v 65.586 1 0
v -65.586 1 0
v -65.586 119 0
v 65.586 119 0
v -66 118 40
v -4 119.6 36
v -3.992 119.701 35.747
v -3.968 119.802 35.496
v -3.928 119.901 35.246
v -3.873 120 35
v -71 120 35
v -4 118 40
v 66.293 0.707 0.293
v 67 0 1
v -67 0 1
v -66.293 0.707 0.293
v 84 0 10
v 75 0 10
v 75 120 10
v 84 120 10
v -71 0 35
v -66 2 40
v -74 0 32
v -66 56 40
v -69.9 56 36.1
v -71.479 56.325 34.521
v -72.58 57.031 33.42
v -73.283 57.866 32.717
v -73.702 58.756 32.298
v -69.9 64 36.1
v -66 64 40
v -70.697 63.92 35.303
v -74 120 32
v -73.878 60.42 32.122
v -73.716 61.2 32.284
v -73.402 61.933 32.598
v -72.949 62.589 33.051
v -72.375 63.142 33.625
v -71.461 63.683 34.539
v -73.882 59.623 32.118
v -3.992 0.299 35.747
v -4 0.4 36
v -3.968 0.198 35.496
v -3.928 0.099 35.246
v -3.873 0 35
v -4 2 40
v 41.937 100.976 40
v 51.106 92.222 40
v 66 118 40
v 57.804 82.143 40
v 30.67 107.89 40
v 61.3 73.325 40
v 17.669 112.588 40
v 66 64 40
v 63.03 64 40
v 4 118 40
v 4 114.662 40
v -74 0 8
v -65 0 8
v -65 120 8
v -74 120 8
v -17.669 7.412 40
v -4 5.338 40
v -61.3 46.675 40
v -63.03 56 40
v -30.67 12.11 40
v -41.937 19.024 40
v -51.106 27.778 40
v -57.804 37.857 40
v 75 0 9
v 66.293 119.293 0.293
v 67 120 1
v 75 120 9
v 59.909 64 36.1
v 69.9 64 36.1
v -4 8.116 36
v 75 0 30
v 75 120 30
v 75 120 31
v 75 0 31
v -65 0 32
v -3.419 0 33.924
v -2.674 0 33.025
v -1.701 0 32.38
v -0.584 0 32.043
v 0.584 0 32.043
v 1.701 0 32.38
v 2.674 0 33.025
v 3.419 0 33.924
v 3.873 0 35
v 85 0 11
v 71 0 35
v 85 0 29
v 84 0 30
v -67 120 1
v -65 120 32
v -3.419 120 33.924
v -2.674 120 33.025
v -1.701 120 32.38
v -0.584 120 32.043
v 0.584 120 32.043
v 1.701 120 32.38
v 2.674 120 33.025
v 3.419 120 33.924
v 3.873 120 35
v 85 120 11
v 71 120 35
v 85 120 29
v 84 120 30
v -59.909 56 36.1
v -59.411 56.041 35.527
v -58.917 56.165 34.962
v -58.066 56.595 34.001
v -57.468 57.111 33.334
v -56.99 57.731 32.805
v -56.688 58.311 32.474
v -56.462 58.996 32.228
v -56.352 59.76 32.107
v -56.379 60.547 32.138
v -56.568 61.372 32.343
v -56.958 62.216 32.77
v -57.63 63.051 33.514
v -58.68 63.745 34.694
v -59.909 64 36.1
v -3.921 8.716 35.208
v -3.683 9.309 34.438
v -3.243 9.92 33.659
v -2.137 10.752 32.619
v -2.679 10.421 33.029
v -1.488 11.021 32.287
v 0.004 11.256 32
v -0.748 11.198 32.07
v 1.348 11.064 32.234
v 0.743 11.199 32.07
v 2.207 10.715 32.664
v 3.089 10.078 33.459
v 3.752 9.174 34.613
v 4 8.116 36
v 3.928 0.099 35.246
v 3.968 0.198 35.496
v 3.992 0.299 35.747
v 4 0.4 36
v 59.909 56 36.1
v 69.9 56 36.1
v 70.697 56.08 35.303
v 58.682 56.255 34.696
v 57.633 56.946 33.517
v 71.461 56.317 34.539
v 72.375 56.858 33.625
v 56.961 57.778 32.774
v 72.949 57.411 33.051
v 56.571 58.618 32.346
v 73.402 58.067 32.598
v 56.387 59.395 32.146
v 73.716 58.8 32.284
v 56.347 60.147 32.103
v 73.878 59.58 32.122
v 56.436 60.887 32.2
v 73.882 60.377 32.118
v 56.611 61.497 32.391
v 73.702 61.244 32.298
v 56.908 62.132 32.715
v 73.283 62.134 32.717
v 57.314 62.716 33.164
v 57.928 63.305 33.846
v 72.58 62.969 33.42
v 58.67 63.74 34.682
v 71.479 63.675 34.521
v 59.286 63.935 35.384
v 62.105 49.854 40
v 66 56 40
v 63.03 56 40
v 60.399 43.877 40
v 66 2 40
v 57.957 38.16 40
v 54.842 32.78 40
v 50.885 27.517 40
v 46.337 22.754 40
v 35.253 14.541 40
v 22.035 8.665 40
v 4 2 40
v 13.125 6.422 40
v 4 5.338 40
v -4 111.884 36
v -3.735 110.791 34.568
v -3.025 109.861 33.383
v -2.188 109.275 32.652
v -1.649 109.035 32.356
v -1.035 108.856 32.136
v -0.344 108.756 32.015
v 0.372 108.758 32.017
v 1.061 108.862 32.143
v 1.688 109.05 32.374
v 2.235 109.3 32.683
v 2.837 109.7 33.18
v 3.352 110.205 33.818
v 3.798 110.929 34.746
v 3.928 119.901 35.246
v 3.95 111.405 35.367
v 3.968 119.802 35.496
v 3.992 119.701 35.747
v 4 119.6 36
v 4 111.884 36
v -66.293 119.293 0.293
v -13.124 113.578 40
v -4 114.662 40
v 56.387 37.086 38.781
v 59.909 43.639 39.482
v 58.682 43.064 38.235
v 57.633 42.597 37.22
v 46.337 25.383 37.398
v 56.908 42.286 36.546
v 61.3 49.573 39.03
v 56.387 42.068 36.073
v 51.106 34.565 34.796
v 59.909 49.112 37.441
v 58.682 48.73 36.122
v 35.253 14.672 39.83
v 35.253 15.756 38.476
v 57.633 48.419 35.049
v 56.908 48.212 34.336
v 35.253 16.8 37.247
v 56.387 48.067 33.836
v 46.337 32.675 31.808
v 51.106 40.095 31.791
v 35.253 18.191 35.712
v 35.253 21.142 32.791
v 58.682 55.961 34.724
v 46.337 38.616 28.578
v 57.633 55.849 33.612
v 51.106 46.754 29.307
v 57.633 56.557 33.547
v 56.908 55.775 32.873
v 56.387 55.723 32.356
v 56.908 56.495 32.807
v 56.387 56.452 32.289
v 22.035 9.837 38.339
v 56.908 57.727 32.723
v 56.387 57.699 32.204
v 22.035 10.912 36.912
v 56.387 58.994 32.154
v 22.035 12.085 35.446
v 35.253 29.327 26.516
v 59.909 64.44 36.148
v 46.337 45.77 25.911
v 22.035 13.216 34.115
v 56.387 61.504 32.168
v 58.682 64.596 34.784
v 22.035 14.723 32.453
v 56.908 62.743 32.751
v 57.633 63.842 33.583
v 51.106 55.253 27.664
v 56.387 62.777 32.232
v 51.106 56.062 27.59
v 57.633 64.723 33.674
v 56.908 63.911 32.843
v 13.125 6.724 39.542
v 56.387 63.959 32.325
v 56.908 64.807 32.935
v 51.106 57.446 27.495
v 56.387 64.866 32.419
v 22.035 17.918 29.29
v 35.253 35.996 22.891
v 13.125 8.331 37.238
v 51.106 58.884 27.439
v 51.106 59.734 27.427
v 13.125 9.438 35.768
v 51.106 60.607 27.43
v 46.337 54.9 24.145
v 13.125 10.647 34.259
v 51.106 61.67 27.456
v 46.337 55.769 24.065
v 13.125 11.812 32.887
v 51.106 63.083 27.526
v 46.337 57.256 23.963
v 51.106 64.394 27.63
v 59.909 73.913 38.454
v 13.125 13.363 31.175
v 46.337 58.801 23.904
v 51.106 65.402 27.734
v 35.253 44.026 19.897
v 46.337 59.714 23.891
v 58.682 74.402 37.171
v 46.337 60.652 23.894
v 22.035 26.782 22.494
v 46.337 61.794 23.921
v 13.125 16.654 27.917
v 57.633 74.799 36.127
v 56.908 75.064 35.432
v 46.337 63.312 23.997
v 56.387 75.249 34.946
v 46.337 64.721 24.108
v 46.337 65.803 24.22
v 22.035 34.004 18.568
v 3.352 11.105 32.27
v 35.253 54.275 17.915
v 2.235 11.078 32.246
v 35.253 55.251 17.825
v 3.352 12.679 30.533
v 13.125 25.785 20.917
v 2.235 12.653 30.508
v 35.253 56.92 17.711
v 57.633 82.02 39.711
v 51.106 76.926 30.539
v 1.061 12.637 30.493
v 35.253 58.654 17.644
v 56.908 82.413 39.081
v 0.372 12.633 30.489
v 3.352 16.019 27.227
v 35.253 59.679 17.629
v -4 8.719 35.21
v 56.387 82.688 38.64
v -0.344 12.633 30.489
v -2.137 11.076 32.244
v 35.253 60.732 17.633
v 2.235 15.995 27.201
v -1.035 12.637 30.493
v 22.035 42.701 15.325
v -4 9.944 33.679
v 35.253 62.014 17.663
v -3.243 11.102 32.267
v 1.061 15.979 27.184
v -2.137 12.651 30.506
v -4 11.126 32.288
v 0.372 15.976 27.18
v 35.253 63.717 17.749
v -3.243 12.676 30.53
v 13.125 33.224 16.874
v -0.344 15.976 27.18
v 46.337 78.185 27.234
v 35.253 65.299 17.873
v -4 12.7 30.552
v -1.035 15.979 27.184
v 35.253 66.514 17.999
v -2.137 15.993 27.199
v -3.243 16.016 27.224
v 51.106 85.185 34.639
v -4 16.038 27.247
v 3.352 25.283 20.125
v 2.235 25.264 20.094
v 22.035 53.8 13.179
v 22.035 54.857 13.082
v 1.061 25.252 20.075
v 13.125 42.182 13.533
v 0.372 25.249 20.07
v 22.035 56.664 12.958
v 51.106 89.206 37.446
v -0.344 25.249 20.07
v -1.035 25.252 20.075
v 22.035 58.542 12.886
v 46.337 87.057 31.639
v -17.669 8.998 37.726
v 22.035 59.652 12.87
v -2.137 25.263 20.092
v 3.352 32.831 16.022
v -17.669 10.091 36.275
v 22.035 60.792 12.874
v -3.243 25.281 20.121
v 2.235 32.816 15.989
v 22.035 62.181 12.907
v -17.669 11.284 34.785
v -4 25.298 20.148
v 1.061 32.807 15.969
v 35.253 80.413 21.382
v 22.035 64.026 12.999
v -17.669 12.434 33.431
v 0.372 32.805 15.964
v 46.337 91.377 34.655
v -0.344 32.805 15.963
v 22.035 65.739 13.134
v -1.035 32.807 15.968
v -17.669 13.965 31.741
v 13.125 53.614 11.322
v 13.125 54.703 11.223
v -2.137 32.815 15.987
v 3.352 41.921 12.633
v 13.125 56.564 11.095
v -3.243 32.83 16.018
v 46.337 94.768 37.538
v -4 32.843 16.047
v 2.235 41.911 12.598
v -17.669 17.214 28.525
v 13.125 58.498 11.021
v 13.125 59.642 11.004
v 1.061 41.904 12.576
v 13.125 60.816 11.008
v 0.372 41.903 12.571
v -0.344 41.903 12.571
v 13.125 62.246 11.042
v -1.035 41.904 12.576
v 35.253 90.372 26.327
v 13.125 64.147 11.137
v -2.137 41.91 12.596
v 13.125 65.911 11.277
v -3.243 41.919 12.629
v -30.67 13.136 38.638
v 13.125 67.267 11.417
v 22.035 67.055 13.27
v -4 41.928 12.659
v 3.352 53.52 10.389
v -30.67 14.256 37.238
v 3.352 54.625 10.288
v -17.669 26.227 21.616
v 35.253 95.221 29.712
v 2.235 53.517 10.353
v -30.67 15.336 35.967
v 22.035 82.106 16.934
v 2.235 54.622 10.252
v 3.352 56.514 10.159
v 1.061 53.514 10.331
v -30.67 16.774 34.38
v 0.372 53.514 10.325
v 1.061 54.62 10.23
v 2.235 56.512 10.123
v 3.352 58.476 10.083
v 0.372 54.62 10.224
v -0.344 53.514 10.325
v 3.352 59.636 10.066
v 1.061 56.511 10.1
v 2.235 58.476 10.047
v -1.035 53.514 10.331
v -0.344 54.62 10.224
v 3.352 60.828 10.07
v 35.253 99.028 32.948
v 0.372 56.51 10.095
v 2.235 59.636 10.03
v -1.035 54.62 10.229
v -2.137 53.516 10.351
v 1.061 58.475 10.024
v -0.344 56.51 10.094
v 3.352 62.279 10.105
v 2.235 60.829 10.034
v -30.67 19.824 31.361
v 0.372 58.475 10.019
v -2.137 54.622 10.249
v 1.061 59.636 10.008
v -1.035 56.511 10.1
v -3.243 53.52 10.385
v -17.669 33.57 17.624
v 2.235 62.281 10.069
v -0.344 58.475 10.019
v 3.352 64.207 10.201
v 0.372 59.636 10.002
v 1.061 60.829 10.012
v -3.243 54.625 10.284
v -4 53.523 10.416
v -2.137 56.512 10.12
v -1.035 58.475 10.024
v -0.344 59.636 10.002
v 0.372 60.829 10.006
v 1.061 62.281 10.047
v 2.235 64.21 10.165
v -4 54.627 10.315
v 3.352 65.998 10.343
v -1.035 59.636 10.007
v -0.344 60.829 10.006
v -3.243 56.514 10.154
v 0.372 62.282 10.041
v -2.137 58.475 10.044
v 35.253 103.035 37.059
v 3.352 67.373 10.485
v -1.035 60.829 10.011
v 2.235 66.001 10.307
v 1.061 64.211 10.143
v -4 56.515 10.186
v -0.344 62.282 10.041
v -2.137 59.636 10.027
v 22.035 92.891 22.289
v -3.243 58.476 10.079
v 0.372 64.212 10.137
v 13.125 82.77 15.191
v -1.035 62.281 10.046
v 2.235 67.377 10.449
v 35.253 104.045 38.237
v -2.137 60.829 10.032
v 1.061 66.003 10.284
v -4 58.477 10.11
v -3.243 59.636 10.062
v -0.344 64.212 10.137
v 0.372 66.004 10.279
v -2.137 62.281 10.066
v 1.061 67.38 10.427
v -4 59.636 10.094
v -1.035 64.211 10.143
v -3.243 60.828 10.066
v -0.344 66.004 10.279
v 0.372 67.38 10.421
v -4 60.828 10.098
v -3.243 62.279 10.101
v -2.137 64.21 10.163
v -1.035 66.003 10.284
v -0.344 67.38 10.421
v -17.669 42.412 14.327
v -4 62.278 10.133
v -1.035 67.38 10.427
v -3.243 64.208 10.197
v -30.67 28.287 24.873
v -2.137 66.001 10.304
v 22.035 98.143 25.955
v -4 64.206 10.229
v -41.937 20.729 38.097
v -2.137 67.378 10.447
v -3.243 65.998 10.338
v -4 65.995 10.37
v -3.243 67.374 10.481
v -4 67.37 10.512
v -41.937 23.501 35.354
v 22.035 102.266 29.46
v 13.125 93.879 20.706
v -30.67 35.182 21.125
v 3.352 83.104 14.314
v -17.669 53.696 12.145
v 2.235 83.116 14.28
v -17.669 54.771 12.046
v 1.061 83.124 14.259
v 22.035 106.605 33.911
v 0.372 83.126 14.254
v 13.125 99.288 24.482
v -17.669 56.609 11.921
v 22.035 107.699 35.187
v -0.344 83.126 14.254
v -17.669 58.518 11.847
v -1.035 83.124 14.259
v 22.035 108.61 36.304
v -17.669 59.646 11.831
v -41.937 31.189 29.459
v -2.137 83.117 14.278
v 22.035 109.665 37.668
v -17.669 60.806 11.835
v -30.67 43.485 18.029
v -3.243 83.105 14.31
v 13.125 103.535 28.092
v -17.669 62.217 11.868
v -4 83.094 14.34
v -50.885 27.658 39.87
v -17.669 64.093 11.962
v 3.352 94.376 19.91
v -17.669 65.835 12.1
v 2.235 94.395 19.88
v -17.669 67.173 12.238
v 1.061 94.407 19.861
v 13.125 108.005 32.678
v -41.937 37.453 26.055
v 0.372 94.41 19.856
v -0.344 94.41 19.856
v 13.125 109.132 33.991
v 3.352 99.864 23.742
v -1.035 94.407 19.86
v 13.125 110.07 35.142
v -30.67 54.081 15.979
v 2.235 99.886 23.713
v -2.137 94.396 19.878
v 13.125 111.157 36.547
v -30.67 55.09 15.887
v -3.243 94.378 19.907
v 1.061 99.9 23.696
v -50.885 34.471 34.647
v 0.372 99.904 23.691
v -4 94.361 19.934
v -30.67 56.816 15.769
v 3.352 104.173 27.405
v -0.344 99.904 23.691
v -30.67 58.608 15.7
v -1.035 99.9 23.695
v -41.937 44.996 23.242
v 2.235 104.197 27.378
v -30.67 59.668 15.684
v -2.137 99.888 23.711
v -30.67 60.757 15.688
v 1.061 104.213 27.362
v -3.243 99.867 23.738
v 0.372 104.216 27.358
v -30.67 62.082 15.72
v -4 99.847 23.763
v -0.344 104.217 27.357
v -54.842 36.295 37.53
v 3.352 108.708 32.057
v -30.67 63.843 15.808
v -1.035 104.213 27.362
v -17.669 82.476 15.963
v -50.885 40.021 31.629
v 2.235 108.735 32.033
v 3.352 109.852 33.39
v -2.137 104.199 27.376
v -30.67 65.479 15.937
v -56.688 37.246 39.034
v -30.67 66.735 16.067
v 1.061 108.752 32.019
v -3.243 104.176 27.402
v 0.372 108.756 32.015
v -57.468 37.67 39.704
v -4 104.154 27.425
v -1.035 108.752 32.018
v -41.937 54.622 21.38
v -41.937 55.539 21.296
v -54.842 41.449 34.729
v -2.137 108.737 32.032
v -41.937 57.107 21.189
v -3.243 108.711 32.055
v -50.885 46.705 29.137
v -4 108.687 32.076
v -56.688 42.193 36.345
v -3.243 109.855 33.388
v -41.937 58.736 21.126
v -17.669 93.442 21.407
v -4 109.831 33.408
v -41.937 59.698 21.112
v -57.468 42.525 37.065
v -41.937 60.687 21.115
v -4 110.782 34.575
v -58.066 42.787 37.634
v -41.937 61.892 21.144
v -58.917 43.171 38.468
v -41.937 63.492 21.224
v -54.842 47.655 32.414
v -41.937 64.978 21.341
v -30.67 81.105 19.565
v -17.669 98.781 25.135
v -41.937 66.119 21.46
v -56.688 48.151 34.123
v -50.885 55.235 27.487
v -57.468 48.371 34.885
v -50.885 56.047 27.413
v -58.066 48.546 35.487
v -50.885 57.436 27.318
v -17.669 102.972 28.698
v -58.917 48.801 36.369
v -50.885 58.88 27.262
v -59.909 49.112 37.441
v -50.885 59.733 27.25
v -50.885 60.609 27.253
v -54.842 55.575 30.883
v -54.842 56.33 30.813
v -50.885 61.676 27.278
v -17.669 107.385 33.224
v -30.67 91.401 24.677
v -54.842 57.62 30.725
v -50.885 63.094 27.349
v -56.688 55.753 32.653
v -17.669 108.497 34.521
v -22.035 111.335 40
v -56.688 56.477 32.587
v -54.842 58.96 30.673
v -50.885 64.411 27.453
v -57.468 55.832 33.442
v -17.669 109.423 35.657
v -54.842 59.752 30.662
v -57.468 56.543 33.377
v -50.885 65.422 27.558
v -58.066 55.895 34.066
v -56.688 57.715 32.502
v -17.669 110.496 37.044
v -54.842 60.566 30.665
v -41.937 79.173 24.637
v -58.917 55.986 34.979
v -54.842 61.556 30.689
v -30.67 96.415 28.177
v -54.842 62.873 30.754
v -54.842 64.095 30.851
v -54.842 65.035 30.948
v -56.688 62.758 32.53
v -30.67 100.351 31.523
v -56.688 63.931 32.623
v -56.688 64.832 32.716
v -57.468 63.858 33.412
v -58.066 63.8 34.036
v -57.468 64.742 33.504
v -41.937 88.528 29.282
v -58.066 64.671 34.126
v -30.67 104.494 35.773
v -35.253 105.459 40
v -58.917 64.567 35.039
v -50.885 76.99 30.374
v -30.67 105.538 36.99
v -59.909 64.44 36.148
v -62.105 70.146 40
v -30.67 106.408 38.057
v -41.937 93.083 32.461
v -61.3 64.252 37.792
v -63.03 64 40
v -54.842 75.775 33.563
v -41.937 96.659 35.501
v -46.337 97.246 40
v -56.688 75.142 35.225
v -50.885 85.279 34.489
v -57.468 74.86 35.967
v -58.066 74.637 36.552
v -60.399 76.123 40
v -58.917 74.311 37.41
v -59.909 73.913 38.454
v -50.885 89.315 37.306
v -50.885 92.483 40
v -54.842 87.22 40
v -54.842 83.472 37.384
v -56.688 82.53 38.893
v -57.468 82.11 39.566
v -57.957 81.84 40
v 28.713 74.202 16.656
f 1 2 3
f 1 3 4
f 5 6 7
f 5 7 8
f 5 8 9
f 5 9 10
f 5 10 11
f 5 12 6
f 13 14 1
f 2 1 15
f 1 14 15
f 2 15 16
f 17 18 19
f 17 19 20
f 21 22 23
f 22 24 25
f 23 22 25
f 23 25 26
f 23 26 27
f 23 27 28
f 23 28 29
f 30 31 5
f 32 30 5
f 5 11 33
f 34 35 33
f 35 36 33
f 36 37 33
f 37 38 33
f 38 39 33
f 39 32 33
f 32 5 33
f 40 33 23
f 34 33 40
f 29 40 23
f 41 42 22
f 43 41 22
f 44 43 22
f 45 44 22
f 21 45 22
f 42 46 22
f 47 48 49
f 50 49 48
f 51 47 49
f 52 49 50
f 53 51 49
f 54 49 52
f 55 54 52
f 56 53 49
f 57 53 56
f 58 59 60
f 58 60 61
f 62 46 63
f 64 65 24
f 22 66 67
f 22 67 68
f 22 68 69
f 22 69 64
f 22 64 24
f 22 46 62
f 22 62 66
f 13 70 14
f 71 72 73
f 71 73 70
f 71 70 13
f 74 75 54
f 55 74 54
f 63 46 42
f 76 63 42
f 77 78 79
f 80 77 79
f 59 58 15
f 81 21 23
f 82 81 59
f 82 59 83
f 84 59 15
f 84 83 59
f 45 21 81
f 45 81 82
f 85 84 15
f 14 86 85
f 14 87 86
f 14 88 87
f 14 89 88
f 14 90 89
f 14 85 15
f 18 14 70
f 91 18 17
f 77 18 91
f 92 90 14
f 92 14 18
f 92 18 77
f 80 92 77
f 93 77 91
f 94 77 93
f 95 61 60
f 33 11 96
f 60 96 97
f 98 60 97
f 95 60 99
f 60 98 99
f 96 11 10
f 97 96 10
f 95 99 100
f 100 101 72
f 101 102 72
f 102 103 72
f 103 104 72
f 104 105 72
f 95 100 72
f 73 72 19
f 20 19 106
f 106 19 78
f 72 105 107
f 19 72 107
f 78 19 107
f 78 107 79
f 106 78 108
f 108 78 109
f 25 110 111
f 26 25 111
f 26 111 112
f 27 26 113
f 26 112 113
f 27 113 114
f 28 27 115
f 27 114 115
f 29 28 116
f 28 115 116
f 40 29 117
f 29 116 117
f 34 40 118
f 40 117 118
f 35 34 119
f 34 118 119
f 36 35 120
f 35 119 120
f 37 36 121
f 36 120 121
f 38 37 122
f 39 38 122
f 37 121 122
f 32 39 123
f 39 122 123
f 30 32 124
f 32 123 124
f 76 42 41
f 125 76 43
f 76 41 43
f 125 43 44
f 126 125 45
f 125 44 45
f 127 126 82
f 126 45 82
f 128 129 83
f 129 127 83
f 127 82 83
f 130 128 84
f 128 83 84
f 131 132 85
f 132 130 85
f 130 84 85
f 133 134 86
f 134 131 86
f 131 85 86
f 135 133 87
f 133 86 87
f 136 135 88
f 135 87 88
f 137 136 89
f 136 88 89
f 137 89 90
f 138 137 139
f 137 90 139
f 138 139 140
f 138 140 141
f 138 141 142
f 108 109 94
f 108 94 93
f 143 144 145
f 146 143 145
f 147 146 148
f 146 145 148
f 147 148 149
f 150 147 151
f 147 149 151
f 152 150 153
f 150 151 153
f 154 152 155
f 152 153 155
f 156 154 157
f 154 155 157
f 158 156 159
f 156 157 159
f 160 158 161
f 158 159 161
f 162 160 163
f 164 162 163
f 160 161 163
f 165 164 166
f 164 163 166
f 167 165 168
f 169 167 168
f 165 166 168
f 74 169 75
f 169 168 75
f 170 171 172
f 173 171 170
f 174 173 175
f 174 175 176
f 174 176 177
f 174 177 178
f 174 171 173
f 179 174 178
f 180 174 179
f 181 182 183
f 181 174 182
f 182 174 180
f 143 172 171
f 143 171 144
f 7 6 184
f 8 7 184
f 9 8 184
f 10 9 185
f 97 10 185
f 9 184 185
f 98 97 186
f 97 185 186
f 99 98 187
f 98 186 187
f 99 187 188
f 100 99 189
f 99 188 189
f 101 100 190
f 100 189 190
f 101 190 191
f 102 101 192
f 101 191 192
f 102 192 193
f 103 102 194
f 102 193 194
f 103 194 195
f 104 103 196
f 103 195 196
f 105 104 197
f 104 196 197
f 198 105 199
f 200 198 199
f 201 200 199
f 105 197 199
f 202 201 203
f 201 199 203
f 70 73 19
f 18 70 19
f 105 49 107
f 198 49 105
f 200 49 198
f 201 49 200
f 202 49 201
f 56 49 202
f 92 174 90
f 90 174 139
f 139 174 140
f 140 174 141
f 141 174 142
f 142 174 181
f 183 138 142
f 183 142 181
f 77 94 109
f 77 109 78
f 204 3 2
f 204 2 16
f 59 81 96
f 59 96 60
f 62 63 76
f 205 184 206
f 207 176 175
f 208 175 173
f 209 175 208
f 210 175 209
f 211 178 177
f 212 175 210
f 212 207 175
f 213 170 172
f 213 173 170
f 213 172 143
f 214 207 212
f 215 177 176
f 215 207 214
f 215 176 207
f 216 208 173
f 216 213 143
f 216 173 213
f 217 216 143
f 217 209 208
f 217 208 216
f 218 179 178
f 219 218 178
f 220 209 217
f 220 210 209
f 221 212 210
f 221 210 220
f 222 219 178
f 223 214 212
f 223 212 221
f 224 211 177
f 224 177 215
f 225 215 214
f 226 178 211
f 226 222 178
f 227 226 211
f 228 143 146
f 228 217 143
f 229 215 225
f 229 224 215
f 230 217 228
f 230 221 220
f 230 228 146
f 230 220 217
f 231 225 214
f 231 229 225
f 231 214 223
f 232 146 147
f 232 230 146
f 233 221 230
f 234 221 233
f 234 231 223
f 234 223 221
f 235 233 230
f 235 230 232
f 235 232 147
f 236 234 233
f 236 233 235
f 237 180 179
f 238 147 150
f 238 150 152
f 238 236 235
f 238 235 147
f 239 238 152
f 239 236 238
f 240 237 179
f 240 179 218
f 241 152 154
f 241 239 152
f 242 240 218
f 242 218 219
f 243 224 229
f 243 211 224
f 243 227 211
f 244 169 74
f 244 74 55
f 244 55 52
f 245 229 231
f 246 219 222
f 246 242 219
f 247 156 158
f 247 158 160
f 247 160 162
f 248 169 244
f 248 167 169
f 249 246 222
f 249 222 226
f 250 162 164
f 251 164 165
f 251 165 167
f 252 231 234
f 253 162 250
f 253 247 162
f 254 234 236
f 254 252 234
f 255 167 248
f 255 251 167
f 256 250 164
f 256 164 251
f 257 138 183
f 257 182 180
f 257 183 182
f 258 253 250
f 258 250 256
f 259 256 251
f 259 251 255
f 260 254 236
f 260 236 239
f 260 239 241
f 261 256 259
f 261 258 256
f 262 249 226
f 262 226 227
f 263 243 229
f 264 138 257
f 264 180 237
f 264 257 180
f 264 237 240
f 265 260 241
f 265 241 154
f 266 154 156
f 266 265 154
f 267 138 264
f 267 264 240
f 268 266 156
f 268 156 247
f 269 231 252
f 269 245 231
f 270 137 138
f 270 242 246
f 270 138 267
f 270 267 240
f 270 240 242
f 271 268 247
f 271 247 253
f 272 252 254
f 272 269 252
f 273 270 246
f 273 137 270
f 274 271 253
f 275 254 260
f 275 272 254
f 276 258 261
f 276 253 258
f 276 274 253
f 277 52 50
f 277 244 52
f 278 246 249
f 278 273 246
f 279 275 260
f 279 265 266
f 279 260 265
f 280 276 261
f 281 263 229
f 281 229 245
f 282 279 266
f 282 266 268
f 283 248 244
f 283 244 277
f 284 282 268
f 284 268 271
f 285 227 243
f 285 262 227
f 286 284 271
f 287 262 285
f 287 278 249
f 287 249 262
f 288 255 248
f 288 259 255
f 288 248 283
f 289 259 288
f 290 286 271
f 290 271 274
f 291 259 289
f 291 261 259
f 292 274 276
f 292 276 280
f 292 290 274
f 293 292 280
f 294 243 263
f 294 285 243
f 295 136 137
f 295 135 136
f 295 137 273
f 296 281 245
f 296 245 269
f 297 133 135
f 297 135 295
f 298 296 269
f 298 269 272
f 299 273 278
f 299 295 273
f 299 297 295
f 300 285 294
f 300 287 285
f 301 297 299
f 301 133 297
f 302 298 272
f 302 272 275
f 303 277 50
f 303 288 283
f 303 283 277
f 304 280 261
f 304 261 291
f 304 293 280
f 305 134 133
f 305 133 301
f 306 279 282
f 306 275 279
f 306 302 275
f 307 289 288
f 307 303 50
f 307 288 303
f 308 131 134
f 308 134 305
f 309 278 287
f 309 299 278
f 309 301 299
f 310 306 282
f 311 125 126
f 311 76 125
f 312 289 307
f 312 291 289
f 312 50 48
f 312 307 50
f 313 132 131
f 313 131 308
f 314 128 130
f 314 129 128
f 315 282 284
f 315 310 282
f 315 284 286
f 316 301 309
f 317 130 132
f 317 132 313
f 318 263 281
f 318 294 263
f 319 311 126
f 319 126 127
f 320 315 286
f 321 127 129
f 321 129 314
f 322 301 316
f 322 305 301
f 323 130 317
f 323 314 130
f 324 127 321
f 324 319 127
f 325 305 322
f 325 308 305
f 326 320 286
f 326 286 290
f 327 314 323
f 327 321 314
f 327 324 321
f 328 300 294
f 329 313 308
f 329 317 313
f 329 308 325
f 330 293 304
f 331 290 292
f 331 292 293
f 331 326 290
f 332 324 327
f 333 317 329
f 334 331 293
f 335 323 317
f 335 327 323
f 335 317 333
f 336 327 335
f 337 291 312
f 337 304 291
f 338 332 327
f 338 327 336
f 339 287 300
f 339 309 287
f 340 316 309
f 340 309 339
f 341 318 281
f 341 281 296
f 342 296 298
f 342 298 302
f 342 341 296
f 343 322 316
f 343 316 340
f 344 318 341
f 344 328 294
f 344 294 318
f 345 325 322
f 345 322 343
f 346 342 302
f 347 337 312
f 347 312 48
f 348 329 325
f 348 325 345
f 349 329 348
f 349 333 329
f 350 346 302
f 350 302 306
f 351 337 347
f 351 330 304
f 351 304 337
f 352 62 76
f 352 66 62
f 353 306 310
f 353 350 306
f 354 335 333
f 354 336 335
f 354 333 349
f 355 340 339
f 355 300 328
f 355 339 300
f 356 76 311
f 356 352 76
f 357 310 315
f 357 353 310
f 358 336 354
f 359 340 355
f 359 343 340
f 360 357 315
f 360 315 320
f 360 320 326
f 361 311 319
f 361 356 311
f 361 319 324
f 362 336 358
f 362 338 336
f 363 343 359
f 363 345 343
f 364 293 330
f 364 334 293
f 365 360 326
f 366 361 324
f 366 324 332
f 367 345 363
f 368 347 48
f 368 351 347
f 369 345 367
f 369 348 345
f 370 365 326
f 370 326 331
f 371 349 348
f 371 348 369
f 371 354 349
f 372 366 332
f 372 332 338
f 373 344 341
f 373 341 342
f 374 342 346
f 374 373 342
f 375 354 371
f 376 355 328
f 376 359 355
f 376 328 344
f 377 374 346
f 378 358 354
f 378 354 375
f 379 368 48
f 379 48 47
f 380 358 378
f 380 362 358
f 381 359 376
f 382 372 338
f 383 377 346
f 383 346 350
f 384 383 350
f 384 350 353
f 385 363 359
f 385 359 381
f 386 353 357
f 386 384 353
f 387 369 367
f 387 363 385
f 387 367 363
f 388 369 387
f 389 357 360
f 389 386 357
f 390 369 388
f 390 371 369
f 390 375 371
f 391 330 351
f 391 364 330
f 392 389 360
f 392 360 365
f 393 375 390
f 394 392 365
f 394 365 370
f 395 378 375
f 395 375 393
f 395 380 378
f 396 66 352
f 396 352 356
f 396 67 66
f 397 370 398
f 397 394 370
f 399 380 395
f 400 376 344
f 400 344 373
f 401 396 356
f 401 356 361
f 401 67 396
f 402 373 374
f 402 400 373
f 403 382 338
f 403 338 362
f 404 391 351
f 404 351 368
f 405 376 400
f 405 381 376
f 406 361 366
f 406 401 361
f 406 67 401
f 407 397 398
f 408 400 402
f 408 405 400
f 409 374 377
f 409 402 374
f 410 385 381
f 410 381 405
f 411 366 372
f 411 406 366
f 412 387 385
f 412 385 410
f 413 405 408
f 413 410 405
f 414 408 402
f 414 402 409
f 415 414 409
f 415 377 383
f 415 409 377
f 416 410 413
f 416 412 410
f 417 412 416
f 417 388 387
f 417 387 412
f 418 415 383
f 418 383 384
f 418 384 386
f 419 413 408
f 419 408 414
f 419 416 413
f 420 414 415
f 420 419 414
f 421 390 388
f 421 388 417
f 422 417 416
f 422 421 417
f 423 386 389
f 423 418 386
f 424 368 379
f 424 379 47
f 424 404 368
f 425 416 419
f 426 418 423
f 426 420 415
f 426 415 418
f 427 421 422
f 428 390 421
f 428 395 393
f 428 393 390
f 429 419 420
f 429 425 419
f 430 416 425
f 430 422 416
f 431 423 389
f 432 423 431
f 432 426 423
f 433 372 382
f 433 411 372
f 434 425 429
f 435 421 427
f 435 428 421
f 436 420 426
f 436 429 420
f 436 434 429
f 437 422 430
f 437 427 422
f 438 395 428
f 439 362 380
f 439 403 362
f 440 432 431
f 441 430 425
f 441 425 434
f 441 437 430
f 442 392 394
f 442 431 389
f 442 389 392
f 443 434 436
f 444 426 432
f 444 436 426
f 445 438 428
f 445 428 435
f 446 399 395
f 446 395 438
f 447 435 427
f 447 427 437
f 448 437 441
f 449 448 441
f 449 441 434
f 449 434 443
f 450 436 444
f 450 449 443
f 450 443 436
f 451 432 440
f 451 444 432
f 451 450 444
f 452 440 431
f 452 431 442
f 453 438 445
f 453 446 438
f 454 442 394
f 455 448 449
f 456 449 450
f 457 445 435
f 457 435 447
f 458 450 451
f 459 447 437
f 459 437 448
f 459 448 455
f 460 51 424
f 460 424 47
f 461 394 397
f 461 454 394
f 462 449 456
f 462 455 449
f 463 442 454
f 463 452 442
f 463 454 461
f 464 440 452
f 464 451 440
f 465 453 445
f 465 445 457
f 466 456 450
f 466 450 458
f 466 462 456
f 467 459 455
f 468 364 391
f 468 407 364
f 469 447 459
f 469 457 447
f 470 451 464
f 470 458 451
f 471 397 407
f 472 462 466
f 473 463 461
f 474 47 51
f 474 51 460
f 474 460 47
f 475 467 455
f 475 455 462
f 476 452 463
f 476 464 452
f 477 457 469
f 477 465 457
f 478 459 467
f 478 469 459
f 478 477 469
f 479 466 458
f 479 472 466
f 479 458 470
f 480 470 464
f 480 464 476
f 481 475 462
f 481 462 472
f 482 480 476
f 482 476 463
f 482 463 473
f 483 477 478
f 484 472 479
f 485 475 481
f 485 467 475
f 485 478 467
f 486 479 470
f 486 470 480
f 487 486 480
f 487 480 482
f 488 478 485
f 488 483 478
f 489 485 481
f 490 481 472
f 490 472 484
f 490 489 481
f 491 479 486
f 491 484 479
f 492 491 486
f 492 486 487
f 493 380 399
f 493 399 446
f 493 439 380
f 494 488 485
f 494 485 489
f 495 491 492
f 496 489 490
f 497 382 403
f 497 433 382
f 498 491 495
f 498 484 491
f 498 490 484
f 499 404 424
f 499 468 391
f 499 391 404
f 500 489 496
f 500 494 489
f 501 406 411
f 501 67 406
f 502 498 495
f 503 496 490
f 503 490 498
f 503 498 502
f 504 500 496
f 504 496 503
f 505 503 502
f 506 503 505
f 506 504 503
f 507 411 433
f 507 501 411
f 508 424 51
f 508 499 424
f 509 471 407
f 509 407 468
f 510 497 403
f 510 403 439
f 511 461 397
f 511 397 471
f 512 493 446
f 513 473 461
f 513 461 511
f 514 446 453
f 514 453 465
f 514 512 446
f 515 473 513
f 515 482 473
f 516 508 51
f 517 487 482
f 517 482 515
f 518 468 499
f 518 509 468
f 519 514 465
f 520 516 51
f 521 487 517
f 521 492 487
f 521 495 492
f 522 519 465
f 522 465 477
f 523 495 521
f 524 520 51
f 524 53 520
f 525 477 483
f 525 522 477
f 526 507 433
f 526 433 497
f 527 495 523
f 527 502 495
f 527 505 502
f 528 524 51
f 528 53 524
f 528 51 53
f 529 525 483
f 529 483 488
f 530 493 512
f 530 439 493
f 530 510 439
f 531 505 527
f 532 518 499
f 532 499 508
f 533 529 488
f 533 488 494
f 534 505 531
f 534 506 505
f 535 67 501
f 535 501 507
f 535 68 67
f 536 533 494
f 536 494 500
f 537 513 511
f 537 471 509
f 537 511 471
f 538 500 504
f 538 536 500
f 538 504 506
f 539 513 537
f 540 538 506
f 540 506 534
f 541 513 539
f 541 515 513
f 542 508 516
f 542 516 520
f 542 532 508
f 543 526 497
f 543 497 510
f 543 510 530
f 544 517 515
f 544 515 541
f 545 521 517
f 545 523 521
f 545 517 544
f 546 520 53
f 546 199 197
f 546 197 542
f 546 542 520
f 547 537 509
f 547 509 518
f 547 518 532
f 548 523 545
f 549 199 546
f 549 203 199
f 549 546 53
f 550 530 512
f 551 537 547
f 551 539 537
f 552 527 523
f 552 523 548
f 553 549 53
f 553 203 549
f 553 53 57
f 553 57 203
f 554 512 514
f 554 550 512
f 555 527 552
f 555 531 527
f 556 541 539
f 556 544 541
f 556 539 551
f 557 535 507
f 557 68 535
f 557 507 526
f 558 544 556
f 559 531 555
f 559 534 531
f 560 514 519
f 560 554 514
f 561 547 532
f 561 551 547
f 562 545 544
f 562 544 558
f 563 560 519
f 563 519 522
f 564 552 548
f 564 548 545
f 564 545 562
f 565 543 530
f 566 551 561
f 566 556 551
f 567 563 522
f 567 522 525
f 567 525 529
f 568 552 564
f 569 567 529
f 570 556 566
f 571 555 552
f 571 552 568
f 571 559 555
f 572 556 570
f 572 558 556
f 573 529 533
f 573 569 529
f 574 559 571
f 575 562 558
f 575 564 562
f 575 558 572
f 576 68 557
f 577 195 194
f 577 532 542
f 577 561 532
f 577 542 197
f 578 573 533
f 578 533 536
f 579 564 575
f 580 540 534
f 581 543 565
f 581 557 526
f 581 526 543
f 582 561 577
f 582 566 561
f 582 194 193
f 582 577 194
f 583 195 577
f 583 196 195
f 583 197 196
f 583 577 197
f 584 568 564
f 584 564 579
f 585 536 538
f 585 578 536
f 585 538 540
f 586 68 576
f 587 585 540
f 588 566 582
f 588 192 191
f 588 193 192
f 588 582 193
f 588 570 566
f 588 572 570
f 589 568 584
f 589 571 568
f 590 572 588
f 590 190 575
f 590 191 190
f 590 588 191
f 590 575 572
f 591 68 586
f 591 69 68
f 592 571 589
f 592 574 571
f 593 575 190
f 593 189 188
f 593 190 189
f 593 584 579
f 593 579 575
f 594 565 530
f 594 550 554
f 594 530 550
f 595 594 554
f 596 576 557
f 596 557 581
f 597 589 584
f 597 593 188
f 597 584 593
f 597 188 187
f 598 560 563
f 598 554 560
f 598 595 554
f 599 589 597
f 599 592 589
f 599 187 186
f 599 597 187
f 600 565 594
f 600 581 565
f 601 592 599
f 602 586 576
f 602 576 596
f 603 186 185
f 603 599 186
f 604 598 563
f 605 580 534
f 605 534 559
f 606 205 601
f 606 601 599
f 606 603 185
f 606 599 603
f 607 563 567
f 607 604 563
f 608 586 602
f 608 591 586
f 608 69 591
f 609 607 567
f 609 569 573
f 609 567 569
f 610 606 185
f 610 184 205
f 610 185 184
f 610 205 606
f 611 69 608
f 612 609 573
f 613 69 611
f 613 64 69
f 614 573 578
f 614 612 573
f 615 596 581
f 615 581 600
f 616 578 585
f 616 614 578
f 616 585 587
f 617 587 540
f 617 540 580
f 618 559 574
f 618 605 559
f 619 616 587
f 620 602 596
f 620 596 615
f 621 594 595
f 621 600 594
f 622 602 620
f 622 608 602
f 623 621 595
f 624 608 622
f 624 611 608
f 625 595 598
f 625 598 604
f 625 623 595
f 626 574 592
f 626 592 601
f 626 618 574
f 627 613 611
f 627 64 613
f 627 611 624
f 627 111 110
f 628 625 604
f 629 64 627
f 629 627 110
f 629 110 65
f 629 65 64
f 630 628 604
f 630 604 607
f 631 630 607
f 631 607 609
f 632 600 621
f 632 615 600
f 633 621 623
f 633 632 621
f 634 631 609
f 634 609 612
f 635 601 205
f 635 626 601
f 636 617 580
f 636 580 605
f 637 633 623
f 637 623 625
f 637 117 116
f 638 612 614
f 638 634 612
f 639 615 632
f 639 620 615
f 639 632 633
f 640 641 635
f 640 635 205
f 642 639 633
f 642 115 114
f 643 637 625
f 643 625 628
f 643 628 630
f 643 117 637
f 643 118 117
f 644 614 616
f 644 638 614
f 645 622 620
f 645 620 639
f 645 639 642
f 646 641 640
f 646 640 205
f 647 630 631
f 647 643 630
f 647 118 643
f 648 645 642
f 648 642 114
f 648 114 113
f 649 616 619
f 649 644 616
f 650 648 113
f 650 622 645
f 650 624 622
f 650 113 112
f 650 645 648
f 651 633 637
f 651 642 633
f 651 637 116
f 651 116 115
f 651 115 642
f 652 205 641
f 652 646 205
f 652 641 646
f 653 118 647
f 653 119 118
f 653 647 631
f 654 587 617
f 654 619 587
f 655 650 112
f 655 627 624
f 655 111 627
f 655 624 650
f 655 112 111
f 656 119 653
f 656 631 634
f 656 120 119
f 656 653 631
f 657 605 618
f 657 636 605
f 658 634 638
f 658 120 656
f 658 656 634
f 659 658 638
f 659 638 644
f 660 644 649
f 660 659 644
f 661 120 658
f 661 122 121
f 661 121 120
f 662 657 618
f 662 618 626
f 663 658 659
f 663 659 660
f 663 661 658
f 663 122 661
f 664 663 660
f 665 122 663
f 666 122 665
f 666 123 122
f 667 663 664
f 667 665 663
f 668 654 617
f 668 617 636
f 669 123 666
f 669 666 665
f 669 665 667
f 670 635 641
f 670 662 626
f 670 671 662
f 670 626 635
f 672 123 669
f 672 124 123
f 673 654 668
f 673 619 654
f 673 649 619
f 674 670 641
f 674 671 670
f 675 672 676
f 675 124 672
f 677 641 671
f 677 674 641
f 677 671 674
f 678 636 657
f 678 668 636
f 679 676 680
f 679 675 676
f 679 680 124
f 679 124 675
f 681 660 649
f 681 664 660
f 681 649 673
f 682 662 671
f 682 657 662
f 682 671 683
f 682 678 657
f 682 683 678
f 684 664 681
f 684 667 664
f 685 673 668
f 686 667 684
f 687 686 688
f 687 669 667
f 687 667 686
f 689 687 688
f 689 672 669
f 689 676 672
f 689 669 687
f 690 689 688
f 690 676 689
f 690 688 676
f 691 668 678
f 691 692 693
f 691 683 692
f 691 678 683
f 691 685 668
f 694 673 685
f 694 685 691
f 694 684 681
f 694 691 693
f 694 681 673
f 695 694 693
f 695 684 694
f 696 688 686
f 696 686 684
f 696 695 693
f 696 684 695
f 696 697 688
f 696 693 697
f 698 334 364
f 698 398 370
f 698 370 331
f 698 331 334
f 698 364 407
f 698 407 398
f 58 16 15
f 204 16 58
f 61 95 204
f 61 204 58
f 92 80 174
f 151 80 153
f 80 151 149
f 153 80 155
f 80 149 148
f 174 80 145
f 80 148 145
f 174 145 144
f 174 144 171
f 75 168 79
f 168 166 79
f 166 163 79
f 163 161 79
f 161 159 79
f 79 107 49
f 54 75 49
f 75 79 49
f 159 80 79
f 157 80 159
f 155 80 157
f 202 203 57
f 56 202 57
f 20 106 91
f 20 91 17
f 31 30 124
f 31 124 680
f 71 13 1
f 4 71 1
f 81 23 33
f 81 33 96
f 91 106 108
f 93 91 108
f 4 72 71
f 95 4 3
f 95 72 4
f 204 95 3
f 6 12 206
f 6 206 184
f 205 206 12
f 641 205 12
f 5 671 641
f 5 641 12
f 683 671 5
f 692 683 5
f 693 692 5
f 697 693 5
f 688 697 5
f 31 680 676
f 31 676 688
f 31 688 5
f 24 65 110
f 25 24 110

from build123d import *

# Parameters (mm, degrees)
F1_DEPTH    = 120
F2_SIZE2    = 2
F2_SIZE     = 5
F2_2_SIZE2  = 2
F2_2_SIZE   = 5
F3_T1_DEPTH = 162.2902937834
F3_T3_DEPTH = 166.2902937834
F4_T1_DEPTH = 125.1433659759
F4_T3_DEPTH = 137.1433659759
F4_T5_DEPTH = 122.2571417204
F10_DEPTH   = 120.001
F12_DEPTH   = 159.001


# Not quite as in the source:
# - a fillet or chamfer that OpenCascade refuses, or shapes differently, is made with other operations: its cross-section is extruded or revolved along the edge and cut away or added


with BuildPart() as f1:
    # F0 (on Front) → F1 (new body)
    with BuildSketch(Plane.XZ):
        Polygon((-75, 8), (-75, 0), (75, 0), (75, 10), (85, 10), (85, 30), (75, 30), (75, 40), (-75, 40), (-75, 32), (-65, 32), (-65, 8), align=None)
    extrude(amount=-F1_DEPTH)

    # F2
    f2_edges = [f1.edges().sort_by_distance(p)[0] for p in [
        (0, 0, 40),
    ]]
    f2_side = f1.faces().sort_by_distance((5.503356, 0, 20))[0]
    chamfer(f2_edges, length=F2_SIZE, length2=F2_SIZE2, reference=f2_side)

    # F2#2
    f2_2_edges = [f1.edges().sort_by_distance(p)[0] for p in [
        (0, 120, 40),
    ]]
    f2_2_side = f1.faces().sort_by_distance((5.503356, 120, 20))[0]
    chamfer(f2_2_edges, length=F2_2_SIZE, length2=F2_2_SIZE2, reference=f2_2_side)

    # F3: chamfer of 9 on 4 edges, made by hand

    # F3_s2 → F3_t1 (cut)
    with BuildSketch(Plane.XZ.offset(-141.1451468917)):
        Polygon((75, 31), (66, 40), (75, 40), align=None)
        Polygon((-66, 40), (-75, 31), (-75, 40), align=None)
    extrude(amount=F3_T1_DEPTH, mode=Mode.SUBTRACT)

    # F3_s4 → F3_t3 (cut)
    with BuildSketch(Plane.XZ.offset(-143.1451468917)):
        Polygon((-66, 0), (-75, 9), (-75, 0), align=None)
        Polygon((75, 9), (66, 0), (75, 0), align=None)
    extrude(amount=F3_T3_DEPTH, mode=Mode.SUBTRACT)

    # F4: chamfer of 1 on 6 edges, made by hand

    # F4_s2 → F4_t1 (cut)
    with BuildSketch(Plane.XZ.offset(-122.571682988)):
        Polygon((84, 30), (85, 29), (85, 30), align=None)
        Polygon((85, 11), (84, 10), (85, 10), align=None)
    extrude(amount=F4_T1_DEPTH, mode=Mode.SUBTRACT)

    # F4_s4 → F4_t3 (cut)
    with BuildSketch(Plane.YZ.offset(-68.571682988)):
        Polygon((0, 1), (1, 0), (0, 0), align=None)
        Polygon((120, 1), (119, 0), (120, 0), align=None)
    extrude(amount=F4_T3_DEPTH, mode=Mode.SUBTRACT)

    # F4_s6 → F4_t5 (cut)
    with BuildSketch(Plane.XZ.offset(-121.1285708602)):
        Polygon((-65.5857864376, 0), (-66.2928932188, 0.2928932188), (-66, 0), align=None)
        Polygon((66.2928932188, 0.2928932188), (65.5857864376, 0), (66, 0), align=None)
    extrude(amount=F4_T5_DEPTH, mode=Mode.SUBTRACT)

    # F6 (on offset) → F8 (revolve, cut)
    with BuildSketch(Plane.XY.offset(75)):
        with BuildLine():
            Line((-75, 60), (75, 60))
            add(Edge.make_bspline(
                [(75, 60), (75, 125), (0, 125), (-75, 125), (-75, 60)],
                knots=[0, 0, 0, 1.5707963268, 1.5707963268, 3.1415926536, 3.1415926536, 3.1415926536], degree=2, weights=[1, 0.7071067812, 1, 0.7071067812, 1]))
        make_face()
    revolve(axis=Axis((-0.8174791932, 60, 75), (1, 0, 0)), mode=Mode.SUBTRACT)

    # F9 (on face) → F10 (cut, through all)
    with BuildSketch(Plane.XZ):
        with BuildLine():
            Line((4, 36), (4, 40))
            Line((4, 40), (-4, 40))
            Line((-4, 40), (-4, 36))
            ThreePointArc((-4, 36), (0, 32), (4, 36))
        make_face()
    extrude(amount=-F10_DEPTH, mode=Mode.SUBTRACT)

    # F11 (on face) → F12 (cut, through all)
    with BuildSketch(Plane.YZ.offset(85)):
        with BuildLine():
            Line((64, 36.1), (64, 40))
            Line((64, 40), (56, 40))
            Line((56, 40), (56, 36.1))
            ThreePointArc((56, 36.1), (60, 32.1), (64, 36.1))
        make_face()
    extrude(amount=-F12_DEPTH, mode=Mode.SUBTRACT)


solid = f1.part
